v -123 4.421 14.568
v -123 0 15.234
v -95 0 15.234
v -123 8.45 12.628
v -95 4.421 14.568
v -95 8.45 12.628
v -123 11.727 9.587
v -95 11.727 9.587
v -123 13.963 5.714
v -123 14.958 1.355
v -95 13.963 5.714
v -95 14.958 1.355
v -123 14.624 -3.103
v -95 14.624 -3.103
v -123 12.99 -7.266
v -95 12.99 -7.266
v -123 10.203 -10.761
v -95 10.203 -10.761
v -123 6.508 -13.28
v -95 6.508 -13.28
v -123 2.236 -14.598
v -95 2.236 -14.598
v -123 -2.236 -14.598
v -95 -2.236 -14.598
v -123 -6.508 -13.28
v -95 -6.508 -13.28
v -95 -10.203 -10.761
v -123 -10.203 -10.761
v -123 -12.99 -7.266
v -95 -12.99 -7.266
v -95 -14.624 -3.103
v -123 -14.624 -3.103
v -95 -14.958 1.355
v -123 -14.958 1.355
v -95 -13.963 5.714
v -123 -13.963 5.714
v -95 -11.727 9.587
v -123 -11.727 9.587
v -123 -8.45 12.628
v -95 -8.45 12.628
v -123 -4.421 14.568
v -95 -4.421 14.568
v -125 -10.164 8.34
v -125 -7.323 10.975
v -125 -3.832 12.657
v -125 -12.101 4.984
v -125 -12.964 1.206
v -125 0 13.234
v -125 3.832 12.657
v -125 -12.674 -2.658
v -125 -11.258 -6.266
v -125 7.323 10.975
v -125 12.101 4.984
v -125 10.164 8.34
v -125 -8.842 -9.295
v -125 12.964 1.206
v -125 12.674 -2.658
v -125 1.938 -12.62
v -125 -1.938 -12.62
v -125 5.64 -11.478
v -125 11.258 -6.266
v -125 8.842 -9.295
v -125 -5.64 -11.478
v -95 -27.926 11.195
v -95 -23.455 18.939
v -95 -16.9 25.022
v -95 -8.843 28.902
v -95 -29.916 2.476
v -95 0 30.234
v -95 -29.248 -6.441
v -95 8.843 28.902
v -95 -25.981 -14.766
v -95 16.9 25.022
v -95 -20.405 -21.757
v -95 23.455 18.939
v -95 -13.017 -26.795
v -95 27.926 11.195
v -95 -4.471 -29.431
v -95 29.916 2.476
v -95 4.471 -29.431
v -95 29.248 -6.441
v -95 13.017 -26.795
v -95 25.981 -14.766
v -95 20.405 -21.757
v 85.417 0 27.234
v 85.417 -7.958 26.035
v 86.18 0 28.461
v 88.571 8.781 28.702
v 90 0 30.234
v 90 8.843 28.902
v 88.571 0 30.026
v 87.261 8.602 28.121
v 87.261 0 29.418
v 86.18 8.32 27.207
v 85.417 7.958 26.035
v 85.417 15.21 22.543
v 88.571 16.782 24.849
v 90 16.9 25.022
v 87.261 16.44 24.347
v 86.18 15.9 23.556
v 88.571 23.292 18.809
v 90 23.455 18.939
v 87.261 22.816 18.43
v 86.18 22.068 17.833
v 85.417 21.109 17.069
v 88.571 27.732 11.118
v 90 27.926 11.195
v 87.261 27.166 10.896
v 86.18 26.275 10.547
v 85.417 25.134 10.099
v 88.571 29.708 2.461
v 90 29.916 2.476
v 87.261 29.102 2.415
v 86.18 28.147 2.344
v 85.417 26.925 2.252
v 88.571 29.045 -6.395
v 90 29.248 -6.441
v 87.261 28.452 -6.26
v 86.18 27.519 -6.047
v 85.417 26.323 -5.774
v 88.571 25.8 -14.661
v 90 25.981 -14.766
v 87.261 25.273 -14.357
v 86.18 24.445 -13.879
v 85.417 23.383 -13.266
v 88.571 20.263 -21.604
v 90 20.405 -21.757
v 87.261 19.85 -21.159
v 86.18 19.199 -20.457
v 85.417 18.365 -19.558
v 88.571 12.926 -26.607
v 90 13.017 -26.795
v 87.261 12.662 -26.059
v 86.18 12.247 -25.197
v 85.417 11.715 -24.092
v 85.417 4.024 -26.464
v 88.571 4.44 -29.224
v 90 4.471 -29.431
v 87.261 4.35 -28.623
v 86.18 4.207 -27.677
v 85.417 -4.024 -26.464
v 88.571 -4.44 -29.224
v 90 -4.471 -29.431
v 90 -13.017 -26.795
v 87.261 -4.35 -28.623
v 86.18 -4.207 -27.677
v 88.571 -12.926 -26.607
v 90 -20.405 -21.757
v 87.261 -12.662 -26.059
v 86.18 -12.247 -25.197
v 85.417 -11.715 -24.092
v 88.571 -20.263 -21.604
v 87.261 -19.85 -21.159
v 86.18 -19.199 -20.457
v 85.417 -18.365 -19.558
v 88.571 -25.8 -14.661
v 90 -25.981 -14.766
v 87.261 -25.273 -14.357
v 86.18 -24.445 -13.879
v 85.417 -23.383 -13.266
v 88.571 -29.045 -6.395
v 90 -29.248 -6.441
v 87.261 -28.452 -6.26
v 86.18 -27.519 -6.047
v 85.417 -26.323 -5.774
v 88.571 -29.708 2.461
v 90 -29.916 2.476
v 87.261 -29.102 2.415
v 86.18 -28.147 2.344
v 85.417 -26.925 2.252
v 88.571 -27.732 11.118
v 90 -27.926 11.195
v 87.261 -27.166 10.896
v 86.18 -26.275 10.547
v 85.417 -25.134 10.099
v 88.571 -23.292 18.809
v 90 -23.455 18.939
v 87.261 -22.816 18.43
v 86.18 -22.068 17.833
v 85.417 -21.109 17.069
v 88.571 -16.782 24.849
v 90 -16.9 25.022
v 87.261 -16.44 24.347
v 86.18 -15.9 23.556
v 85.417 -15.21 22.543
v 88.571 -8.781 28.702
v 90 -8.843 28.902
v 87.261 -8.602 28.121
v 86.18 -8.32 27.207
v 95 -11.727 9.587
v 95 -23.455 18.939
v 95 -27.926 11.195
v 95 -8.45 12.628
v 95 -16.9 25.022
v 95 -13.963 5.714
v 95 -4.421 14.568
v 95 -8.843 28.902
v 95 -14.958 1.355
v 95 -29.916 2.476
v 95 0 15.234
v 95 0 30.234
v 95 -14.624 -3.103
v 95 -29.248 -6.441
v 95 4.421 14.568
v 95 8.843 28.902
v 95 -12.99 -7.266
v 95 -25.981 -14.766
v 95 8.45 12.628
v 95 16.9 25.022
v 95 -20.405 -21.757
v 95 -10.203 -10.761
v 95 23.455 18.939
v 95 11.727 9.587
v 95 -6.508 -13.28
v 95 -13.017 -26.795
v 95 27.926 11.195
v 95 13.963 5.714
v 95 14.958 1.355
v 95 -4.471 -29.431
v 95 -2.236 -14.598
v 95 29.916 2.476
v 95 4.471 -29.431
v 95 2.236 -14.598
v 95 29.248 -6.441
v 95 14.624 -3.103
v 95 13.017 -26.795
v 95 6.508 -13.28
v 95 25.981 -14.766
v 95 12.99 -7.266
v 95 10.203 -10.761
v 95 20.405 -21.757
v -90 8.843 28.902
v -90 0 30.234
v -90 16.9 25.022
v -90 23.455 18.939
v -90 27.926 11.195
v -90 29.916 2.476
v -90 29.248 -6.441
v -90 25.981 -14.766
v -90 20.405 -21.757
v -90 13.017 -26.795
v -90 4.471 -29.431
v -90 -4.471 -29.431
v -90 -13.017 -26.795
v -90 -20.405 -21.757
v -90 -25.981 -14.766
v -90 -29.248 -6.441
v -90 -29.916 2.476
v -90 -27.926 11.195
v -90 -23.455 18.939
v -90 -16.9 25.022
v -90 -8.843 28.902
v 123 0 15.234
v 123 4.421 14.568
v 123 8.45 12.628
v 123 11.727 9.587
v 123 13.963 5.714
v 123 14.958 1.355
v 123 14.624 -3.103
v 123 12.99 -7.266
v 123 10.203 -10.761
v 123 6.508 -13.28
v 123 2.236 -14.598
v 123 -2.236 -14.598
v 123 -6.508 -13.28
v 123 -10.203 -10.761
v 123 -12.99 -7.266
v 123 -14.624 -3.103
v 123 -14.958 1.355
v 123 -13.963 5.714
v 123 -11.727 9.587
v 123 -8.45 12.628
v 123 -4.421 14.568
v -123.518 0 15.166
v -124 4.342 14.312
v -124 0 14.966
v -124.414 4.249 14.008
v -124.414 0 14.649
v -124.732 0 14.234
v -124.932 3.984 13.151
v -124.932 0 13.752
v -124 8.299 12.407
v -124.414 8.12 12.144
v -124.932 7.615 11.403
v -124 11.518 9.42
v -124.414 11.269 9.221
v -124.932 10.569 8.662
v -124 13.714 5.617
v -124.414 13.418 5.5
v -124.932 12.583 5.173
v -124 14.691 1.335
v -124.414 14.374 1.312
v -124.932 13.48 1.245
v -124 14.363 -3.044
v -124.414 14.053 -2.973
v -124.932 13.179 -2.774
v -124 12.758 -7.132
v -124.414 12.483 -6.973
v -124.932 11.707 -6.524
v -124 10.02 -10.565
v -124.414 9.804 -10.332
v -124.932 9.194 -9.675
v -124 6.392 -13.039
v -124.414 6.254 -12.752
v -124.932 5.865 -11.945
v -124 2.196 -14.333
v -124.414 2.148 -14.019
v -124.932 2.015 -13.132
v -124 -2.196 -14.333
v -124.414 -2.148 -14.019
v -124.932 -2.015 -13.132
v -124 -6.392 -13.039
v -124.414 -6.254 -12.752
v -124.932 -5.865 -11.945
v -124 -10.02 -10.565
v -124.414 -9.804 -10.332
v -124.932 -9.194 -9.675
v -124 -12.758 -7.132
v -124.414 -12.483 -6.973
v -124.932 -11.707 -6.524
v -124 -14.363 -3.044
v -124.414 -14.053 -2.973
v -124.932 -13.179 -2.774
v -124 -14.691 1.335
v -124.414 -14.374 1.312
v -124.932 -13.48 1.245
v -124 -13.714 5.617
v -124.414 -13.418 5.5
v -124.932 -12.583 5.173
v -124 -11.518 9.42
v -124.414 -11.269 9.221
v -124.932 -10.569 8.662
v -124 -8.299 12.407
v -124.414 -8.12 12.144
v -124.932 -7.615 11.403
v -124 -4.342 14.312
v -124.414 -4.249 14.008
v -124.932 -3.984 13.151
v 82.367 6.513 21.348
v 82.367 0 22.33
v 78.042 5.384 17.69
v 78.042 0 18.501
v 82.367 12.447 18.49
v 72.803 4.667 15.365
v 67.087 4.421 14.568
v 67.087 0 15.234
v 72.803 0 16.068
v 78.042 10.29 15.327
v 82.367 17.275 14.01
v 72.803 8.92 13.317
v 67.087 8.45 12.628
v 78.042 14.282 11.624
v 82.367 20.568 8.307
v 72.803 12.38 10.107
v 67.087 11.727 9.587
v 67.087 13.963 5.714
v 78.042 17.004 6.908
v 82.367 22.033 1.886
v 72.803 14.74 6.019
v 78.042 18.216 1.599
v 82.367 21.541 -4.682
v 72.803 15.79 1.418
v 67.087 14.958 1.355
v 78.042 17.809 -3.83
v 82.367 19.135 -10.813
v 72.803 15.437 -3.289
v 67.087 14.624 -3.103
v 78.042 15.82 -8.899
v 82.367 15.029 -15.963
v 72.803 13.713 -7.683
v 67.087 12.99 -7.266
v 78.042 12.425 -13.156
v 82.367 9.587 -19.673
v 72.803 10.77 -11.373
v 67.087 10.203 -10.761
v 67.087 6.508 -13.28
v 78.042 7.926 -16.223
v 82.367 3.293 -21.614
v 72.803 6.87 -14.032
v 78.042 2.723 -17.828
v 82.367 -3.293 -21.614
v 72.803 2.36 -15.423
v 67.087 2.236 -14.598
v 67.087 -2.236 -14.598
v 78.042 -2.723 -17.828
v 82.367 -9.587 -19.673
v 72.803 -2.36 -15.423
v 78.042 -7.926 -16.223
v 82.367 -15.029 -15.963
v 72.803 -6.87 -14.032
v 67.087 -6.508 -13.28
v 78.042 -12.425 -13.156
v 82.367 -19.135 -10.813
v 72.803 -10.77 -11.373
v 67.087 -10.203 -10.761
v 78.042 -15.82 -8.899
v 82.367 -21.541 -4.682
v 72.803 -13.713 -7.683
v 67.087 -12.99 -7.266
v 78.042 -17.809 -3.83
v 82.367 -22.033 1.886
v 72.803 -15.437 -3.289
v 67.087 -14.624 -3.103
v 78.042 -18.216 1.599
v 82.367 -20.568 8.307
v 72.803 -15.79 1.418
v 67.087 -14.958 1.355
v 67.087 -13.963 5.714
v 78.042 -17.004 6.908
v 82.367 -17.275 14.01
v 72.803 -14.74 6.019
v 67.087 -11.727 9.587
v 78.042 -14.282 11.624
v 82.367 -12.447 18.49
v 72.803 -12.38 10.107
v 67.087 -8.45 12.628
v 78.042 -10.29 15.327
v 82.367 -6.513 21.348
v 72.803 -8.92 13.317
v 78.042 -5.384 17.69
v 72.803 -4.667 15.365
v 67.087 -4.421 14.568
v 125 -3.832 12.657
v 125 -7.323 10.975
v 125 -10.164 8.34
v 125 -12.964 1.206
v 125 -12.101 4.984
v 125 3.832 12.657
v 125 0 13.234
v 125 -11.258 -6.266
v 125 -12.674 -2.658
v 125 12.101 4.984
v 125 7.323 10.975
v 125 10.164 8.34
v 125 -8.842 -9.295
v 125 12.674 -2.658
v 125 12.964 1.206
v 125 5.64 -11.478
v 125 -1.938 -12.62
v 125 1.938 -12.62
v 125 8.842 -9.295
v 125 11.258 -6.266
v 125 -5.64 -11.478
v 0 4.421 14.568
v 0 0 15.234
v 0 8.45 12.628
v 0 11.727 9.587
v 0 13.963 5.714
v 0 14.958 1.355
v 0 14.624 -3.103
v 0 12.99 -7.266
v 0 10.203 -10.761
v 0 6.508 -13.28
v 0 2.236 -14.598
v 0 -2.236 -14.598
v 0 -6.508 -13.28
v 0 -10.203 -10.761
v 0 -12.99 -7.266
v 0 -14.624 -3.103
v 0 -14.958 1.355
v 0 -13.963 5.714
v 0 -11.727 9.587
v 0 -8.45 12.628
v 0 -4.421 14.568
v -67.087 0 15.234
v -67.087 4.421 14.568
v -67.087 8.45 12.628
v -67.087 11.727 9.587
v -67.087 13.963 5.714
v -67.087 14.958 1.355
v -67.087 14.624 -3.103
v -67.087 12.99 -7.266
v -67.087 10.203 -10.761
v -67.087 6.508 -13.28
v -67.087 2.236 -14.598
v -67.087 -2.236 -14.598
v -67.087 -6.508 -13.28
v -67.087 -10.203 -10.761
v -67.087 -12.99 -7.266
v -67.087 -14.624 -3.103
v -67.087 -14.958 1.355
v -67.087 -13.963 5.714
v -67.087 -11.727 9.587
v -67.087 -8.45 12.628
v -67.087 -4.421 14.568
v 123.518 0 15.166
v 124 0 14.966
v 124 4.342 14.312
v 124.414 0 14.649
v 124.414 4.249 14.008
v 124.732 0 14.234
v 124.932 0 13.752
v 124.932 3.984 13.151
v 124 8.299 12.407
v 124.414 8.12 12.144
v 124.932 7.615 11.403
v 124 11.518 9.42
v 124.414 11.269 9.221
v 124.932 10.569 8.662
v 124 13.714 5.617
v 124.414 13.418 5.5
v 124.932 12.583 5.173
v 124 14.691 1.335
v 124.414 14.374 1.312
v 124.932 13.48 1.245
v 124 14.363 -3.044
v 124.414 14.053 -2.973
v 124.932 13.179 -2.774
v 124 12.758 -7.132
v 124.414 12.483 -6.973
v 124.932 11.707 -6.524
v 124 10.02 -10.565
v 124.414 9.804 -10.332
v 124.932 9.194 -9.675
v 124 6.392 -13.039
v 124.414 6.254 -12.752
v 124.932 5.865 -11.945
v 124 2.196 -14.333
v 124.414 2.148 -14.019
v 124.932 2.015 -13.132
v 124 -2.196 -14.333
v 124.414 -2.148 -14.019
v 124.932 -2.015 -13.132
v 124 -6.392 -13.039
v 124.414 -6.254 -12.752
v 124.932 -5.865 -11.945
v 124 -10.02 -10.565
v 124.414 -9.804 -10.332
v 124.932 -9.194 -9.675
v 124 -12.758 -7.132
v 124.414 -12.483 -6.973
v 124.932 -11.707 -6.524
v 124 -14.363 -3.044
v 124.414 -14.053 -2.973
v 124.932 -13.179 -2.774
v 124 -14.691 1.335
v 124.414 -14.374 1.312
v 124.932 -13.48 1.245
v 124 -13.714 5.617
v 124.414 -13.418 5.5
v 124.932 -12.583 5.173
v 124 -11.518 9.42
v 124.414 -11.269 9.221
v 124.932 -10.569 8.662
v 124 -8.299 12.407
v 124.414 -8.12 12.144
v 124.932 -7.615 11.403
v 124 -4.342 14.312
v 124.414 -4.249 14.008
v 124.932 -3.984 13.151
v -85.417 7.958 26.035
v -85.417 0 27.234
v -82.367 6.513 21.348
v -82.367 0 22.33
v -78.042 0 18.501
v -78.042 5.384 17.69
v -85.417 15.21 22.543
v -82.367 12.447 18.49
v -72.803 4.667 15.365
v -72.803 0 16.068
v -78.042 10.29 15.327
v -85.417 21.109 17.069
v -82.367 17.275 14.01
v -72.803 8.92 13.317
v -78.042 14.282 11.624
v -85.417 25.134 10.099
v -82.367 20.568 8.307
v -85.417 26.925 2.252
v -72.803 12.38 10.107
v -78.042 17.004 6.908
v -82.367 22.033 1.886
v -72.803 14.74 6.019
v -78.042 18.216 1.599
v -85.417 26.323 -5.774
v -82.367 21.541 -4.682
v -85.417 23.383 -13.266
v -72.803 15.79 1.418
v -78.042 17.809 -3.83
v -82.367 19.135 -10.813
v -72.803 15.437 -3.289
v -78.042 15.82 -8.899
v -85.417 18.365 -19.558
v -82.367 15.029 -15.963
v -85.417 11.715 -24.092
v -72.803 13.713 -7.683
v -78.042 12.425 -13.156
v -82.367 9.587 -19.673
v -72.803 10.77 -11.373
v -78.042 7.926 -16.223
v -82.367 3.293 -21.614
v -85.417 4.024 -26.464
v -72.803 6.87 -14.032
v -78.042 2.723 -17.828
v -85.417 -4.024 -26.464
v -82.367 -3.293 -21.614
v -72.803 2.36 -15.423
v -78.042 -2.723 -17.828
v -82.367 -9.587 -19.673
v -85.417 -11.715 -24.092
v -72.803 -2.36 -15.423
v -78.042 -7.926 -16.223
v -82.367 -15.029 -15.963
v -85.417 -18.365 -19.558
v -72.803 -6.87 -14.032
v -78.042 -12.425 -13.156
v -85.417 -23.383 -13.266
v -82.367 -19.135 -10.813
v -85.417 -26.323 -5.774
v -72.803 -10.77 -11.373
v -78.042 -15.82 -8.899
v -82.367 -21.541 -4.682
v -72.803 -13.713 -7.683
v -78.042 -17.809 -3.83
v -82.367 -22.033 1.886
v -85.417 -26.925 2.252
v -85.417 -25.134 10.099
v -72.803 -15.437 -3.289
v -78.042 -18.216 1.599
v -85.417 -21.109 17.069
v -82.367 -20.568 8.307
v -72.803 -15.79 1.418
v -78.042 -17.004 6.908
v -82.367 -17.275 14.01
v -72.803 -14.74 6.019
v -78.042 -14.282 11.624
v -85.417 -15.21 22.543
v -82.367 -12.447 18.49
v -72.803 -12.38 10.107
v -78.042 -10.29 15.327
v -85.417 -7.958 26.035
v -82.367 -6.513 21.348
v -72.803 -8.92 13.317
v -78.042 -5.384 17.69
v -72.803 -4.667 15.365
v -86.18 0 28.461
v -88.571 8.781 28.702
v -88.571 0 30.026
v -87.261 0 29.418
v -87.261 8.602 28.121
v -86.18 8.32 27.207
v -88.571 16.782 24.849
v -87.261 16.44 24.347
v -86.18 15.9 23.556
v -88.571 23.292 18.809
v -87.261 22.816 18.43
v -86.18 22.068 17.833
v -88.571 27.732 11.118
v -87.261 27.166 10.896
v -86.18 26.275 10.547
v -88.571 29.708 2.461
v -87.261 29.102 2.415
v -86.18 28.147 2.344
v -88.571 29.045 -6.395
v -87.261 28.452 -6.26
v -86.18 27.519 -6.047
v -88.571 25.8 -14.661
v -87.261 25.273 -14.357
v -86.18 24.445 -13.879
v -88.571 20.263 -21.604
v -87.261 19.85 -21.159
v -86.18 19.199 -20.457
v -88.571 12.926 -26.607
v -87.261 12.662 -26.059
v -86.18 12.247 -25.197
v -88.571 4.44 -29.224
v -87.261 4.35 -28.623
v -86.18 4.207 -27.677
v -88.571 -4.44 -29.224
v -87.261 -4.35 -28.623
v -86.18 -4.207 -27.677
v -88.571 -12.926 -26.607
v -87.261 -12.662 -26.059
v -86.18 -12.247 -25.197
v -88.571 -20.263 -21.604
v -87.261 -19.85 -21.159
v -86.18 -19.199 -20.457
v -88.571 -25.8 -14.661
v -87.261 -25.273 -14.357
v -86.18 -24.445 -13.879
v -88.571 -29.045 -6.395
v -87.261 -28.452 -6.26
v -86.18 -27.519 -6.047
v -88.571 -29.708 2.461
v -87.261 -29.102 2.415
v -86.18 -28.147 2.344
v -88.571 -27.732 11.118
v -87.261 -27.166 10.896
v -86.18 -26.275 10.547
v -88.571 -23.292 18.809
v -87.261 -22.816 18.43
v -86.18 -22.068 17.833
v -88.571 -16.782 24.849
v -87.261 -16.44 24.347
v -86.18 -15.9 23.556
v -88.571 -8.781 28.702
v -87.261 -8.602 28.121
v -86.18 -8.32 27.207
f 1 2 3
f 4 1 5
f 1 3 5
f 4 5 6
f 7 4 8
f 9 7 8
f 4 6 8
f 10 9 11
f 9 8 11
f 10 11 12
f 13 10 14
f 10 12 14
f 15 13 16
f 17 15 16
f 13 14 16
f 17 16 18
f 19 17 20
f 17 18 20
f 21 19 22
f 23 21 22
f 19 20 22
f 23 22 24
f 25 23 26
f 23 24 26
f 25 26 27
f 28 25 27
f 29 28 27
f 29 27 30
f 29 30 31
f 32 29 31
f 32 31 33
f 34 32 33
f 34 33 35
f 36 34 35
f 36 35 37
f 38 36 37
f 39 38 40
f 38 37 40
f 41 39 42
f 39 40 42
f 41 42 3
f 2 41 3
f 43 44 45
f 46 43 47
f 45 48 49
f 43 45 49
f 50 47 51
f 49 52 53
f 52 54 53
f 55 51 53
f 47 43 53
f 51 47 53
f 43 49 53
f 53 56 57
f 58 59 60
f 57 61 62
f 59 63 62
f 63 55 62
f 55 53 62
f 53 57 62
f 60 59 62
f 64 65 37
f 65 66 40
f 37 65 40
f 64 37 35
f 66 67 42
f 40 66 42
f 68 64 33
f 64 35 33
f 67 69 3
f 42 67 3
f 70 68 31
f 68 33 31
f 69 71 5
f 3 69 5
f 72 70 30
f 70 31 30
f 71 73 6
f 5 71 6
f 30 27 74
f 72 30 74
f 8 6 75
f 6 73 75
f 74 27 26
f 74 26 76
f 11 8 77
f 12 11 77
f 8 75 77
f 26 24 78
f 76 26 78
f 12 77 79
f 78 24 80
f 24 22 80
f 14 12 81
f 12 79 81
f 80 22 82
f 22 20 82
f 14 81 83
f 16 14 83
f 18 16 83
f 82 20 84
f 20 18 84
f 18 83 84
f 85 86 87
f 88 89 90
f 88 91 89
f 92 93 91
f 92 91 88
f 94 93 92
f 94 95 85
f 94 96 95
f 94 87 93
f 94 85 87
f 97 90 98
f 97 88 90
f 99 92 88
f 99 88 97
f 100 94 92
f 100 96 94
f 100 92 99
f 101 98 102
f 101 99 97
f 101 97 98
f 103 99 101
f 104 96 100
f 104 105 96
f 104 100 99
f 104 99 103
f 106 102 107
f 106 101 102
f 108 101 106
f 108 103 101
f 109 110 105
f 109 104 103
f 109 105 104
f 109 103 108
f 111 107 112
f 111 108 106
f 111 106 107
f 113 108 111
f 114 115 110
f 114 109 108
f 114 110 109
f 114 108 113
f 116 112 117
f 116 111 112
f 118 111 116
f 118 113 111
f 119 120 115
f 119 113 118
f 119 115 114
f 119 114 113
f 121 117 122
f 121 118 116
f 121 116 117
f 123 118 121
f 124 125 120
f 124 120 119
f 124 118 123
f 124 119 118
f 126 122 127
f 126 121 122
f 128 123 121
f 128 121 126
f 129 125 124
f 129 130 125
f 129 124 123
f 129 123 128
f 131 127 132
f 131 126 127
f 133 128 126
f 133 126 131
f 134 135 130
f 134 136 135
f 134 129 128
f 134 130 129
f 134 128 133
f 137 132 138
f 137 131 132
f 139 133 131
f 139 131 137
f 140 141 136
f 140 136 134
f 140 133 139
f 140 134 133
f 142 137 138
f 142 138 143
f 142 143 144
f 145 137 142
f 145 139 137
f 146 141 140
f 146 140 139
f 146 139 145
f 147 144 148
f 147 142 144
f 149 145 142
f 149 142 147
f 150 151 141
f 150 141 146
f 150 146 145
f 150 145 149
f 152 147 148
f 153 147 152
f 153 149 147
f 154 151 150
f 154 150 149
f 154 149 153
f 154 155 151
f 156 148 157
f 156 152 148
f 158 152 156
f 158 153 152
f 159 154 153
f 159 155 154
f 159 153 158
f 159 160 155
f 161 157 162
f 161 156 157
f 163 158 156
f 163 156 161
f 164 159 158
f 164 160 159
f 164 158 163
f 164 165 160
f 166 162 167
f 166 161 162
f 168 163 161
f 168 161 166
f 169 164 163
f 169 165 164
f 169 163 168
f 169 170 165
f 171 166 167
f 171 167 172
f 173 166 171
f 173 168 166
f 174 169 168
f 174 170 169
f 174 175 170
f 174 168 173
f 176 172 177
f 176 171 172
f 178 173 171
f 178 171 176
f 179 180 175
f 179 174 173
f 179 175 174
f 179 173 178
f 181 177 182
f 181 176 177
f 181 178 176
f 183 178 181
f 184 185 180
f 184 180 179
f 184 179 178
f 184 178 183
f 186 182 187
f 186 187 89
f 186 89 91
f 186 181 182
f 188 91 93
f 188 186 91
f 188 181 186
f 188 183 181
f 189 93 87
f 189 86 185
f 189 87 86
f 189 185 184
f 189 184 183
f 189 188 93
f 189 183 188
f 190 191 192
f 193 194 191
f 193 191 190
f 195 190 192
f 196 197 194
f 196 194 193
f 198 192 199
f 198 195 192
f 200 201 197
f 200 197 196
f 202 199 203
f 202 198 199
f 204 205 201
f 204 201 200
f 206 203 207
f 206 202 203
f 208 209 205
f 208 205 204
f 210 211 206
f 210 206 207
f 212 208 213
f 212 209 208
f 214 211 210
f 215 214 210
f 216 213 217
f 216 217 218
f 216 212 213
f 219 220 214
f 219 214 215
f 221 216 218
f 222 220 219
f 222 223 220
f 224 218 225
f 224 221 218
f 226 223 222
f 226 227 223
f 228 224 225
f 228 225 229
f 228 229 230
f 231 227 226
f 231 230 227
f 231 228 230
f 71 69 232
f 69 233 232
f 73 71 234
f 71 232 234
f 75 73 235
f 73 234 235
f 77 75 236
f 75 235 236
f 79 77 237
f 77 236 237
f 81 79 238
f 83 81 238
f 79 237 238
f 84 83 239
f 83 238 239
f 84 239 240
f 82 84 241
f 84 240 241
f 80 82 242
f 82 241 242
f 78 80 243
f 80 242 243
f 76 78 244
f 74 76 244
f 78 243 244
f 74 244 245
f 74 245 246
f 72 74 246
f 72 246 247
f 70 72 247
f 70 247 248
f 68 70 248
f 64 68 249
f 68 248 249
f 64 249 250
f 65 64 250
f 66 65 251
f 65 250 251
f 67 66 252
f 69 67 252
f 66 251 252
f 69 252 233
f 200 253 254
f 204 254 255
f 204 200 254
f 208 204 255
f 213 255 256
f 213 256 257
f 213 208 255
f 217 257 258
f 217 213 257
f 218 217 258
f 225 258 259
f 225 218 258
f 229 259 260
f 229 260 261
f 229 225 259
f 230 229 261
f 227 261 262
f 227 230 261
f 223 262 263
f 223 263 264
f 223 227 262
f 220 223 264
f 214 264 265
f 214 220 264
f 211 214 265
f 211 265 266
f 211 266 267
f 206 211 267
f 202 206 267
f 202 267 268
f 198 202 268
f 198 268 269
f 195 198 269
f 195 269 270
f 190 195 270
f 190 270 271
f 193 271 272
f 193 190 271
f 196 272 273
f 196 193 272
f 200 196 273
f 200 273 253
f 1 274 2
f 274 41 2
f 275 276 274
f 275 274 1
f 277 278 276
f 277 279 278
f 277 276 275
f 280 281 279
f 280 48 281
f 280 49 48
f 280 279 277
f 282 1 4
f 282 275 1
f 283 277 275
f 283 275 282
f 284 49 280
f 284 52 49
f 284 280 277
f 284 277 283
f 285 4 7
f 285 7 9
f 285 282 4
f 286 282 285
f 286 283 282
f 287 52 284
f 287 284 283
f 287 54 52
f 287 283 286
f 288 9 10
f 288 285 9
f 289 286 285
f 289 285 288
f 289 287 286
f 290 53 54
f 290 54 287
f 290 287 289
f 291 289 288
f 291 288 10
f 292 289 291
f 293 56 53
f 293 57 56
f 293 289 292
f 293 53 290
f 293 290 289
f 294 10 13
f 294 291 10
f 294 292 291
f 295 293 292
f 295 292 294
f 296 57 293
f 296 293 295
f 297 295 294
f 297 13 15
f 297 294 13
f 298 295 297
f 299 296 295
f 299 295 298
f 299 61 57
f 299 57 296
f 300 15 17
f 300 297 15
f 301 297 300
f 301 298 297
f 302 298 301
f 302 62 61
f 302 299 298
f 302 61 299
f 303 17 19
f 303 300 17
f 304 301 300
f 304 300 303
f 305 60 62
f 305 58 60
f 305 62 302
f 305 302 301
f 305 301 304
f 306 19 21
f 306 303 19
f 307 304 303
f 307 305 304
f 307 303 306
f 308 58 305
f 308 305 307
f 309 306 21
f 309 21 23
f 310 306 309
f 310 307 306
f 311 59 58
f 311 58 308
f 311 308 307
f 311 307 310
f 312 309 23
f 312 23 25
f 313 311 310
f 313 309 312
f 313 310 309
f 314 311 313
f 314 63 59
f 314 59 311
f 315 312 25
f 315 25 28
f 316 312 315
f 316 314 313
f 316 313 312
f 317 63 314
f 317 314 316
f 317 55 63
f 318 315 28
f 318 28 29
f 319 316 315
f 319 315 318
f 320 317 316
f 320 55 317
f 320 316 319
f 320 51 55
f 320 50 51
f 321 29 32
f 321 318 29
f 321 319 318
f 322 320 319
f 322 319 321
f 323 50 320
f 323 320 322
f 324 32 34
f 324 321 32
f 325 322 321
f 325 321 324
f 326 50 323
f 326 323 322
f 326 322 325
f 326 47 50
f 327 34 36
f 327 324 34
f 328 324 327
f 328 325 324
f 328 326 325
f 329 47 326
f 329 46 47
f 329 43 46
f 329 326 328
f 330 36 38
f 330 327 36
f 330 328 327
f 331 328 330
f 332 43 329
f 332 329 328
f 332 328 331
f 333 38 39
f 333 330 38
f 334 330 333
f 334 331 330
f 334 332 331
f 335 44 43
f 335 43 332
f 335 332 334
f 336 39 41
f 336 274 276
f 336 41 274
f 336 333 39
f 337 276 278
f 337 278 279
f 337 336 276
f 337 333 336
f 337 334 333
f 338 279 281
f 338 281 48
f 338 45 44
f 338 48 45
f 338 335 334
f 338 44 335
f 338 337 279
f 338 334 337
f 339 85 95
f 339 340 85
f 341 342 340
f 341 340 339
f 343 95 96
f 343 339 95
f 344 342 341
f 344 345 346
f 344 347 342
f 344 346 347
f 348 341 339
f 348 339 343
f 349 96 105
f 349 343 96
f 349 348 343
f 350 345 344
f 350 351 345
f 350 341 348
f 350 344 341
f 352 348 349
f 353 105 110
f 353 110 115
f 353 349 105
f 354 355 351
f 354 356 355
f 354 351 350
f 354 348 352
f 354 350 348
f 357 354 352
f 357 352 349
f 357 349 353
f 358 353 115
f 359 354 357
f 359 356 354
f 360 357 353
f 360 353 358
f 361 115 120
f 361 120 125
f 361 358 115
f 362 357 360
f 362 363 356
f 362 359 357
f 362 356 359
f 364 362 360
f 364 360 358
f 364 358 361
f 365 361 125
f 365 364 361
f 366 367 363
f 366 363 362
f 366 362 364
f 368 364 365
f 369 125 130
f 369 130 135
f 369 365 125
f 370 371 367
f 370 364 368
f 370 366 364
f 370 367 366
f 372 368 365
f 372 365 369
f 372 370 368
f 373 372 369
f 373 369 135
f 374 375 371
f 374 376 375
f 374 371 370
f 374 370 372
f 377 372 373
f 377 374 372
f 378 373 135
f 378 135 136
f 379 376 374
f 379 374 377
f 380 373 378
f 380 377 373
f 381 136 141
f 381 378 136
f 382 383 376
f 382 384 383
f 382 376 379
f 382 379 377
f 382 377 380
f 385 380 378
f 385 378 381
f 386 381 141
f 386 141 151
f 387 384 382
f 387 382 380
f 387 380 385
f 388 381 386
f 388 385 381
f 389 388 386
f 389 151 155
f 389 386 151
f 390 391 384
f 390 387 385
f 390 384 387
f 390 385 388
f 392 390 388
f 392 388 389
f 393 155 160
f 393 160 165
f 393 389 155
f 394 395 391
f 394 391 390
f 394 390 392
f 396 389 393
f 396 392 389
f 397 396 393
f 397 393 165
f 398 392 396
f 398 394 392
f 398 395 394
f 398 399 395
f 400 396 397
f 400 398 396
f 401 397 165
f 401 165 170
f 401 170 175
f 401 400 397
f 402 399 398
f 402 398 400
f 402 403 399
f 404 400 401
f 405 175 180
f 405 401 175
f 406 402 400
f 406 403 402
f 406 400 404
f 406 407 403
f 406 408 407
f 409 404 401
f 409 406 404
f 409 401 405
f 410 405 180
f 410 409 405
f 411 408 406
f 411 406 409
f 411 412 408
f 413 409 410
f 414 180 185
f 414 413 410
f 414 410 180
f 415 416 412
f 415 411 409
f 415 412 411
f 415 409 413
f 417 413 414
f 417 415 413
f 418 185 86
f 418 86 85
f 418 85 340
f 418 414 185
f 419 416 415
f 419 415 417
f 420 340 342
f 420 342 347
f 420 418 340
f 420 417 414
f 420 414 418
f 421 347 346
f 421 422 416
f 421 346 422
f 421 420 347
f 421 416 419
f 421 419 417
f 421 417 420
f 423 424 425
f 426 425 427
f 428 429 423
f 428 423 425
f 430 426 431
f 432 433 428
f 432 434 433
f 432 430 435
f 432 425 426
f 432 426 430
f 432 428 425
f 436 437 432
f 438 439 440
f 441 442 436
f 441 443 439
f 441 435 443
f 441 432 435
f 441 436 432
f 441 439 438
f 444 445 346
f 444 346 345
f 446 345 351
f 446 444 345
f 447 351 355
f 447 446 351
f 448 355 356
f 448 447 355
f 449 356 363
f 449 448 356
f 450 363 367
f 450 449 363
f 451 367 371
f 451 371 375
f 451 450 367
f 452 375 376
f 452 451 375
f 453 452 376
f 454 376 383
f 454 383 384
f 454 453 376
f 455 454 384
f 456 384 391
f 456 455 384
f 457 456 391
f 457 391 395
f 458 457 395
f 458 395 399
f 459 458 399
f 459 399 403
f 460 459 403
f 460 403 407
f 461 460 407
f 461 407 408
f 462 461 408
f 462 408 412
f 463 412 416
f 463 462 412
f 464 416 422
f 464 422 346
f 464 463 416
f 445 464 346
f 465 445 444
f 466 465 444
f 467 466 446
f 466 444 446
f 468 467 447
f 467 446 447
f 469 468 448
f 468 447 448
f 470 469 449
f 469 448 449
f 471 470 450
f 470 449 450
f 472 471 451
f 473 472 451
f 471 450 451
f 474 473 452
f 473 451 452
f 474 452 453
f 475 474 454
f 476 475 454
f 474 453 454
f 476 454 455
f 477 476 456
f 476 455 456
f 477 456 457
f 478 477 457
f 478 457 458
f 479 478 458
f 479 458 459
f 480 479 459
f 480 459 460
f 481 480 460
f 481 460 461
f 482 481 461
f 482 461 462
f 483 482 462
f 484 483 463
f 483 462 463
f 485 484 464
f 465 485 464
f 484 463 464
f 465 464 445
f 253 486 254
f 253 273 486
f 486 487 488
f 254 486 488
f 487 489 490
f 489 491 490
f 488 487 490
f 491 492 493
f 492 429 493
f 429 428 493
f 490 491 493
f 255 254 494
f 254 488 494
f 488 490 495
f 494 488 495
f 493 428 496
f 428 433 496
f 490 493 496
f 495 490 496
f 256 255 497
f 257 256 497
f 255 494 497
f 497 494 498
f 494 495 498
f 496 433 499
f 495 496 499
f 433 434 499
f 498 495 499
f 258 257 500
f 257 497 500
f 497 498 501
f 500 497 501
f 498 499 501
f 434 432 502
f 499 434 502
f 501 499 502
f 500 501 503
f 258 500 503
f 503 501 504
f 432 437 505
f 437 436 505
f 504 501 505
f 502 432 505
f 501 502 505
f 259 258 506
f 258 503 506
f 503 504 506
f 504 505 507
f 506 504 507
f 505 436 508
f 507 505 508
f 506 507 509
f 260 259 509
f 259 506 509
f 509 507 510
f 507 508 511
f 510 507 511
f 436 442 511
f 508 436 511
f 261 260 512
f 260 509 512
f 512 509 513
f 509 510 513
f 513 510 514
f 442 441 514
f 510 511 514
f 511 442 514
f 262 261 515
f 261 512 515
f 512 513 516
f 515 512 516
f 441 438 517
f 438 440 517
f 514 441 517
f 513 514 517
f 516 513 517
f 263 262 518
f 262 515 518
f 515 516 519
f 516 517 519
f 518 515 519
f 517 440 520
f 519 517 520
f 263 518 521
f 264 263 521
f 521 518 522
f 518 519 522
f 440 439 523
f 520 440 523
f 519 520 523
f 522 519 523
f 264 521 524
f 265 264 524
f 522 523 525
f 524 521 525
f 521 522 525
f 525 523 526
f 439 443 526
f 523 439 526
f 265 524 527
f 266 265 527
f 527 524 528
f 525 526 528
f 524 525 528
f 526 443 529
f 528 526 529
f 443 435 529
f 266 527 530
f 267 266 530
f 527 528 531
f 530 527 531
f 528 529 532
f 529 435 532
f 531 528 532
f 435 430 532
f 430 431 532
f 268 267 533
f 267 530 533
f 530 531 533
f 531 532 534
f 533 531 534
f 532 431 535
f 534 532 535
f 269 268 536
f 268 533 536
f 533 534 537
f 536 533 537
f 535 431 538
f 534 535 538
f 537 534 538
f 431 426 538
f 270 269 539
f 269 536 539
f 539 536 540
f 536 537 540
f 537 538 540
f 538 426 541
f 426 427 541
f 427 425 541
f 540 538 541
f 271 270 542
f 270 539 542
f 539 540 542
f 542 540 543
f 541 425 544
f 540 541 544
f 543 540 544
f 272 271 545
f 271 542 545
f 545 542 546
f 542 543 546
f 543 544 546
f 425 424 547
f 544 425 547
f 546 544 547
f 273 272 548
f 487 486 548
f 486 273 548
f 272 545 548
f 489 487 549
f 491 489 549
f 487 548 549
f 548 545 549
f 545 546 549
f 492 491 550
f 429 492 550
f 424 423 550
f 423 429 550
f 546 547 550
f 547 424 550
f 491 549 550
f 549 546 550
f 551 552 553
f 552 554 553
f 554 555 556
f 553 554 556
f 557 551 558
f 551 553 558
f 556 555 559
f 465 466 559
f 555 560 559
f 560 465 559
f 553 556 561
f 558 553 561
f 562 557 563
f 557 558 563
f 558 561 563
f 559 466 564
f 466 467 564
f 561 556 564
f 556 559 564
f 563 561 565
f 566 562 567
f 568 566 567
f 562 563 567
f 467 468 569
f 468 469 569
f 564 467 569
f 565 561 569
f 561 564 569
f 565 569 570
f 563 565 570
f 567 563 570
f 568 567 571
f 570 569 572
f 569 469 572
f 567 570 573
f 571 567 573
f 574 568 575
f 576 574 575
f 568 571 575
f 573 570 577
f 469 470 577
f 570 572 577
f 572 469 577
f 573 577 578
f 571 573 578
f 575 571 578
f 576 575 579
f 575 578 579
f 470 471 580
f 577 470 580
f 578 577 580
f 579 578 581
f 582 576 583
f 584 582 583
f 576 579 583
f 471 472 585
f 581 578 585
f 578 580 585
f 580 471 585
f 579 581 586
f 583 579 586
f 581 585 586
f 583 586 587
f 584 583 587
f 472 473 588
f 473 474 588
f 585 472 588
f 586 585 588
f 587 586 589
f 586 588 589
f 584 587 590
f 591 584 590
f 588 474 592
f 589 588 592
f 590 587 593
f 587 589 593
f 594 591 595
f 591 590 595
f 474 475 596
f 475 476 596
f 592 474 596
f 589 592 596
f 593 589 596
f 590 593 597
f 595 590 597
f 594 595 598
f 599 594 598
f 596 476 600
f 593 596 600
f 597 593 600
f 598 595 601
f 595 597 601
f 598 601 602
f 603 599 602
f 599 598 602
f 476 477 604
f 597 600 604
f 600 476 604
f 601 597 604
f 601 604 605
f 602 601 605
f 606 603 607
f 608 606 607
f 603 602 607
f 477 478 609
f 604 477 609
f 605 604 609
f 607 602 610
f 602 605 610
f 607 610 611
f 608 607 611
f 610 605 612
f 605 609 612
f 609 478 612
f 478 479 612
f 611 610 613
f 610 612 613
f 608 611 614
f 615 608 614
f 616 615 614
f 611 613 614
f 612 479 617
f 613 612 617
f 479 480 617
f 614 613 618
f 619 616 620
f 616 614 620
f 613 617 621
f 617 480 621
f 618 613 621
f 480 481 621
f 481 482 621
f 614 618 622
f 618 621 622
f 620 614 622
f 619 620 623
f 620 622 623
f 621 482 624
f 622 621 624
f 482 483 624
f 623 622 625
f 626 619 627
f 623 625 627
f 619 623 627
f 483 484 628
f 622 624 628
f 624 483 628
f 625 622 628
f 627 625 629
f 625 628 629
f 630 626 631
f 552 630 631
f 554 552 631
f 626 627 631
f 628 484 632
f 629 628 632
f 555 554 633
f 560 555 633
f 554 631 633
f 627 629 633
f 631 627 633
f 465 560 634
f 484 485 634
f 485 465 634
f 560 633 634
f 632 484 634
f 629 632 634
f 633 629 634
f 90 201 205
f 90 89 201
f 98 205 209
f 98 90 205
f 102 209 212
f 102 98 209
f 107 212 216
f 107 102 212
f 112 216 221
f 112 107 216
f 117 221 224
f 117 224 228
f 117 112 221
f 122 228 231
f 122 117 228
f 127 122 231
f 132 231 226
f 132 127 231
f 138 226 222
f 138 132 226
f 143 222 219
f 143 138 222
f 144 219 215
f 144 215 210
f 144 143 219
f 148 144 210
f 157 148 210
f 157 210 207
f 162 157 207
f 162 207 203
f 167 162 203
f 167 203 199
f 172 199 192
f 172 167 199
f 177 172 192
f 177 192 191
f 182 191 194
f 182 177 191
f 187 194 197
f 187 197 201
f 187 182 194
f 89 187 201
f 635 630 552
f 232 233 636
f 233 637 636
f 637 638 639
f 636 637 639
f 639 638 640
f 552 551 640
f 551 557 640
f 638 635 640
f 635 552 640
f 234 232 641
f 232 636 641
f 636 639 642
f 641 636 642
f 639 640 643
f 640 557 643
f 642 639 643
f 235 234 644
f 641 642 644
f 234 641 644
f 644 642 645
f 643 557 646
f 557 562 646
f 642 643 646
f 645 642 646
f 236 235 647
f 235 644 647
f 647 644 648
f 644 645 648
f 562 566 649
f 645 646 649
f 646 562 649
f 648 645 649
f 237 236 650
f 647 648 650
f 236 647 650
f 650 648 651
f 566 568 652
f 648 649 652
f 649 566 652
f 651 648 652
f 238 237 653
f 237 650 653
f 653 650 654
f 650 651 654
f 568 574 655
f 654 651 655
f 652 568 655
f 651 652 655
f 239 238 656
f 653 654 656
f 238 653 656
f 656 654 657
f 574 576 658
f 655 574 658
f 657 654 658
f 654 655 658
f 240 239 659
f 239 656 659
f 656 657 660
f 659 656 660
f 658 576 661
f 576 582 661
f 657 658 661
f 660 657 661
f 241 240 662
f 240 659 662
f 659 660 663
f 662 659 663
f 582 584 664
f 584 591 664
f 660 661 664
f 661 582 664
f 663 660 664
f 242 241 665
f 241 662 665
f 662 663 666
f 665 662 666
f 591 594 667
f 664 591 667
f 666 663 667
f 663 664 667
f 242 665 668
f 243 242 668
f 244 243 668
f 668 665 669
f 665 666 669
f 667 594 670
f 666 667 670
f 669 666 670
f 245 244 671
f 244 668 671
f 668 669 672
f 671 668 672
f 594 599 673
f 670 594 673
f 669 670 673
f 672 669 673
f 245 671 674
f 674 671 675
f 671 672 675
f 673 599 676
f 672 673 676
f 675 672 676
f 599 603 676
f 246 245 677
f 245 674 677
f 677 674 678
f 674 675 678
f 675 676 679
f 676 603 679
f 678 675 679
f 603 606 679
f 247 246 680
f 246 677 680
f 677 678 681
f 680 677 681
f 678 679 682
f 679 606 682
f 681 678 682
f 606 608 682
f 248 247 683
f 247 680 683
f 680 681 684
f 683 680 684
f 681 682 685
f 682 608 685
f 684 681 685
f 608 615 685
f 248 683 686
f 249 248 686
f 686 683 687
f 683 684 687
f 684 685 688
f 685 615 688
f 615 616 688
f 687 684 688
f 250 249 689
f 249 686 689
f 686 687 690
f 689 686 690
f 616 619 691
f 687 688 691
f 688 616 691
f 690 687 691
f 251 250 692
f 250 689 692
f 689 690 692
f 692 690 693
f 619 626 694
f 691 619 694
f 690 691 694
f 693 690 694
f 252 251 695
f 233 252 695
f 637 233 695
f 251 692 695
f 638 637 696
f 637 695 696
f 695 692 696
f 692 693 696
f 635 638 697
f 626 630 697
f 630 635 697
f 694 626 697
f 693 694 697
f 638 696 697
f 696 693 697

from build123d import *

# Parameters (mm, degrees)
F3_R = 2


with BuildPart() as f1:
    # F0 (on Front) → F1 (revolve)
    with BuildSketch(Plane.XZ):
        with BuildLine():
            Line((67.0871215252, 15.234352517), (0, 15.234352517))
            Line((0, 15.234352517), (0, 0.234352517))
            Line((0, 0.234352517), (125, 0.234352517))
            Line((125, 0.234352517), (125, 15.234352517))
            Line((125, 15.234352517), (95, 15.234352517))
            Line((95, 15.234352517), (95, 30.234352517))
            Line((95, 30.234352517), (90, 30.234352517))
            ThreePointArc((90, 30.234352517), (87.2613872125, 29.4176526497), (85.417424305, 27.234352517))
            ThreePointArc((85.417424305, 27.234352517), (78.0415726753, 18.5011519863), (67.0871215252, 15.234352517))
        make_face()
    revolve(axis=Axis((62.5, 0, 0.234352517), (-1, 0, 0)))

    # F2: F1 across face


with BuildPart() as f1_1:
    add(f1.part)
    add(f1.part.mirror(Plane(origin=(0, 0, 0.234352517), x_dir=(0, -1, 0), z_dir=(-1, 0, 0))))

    # F3
    f3_edges = [f1_1.edges().sort_by_distance(p)[0] for p in [
        (-125, 0, -14.765647),
        (125, 0, -14.765647),
    ]]
    fillet(f3_edges, radius=F3_R)


solid = f1_1.part
